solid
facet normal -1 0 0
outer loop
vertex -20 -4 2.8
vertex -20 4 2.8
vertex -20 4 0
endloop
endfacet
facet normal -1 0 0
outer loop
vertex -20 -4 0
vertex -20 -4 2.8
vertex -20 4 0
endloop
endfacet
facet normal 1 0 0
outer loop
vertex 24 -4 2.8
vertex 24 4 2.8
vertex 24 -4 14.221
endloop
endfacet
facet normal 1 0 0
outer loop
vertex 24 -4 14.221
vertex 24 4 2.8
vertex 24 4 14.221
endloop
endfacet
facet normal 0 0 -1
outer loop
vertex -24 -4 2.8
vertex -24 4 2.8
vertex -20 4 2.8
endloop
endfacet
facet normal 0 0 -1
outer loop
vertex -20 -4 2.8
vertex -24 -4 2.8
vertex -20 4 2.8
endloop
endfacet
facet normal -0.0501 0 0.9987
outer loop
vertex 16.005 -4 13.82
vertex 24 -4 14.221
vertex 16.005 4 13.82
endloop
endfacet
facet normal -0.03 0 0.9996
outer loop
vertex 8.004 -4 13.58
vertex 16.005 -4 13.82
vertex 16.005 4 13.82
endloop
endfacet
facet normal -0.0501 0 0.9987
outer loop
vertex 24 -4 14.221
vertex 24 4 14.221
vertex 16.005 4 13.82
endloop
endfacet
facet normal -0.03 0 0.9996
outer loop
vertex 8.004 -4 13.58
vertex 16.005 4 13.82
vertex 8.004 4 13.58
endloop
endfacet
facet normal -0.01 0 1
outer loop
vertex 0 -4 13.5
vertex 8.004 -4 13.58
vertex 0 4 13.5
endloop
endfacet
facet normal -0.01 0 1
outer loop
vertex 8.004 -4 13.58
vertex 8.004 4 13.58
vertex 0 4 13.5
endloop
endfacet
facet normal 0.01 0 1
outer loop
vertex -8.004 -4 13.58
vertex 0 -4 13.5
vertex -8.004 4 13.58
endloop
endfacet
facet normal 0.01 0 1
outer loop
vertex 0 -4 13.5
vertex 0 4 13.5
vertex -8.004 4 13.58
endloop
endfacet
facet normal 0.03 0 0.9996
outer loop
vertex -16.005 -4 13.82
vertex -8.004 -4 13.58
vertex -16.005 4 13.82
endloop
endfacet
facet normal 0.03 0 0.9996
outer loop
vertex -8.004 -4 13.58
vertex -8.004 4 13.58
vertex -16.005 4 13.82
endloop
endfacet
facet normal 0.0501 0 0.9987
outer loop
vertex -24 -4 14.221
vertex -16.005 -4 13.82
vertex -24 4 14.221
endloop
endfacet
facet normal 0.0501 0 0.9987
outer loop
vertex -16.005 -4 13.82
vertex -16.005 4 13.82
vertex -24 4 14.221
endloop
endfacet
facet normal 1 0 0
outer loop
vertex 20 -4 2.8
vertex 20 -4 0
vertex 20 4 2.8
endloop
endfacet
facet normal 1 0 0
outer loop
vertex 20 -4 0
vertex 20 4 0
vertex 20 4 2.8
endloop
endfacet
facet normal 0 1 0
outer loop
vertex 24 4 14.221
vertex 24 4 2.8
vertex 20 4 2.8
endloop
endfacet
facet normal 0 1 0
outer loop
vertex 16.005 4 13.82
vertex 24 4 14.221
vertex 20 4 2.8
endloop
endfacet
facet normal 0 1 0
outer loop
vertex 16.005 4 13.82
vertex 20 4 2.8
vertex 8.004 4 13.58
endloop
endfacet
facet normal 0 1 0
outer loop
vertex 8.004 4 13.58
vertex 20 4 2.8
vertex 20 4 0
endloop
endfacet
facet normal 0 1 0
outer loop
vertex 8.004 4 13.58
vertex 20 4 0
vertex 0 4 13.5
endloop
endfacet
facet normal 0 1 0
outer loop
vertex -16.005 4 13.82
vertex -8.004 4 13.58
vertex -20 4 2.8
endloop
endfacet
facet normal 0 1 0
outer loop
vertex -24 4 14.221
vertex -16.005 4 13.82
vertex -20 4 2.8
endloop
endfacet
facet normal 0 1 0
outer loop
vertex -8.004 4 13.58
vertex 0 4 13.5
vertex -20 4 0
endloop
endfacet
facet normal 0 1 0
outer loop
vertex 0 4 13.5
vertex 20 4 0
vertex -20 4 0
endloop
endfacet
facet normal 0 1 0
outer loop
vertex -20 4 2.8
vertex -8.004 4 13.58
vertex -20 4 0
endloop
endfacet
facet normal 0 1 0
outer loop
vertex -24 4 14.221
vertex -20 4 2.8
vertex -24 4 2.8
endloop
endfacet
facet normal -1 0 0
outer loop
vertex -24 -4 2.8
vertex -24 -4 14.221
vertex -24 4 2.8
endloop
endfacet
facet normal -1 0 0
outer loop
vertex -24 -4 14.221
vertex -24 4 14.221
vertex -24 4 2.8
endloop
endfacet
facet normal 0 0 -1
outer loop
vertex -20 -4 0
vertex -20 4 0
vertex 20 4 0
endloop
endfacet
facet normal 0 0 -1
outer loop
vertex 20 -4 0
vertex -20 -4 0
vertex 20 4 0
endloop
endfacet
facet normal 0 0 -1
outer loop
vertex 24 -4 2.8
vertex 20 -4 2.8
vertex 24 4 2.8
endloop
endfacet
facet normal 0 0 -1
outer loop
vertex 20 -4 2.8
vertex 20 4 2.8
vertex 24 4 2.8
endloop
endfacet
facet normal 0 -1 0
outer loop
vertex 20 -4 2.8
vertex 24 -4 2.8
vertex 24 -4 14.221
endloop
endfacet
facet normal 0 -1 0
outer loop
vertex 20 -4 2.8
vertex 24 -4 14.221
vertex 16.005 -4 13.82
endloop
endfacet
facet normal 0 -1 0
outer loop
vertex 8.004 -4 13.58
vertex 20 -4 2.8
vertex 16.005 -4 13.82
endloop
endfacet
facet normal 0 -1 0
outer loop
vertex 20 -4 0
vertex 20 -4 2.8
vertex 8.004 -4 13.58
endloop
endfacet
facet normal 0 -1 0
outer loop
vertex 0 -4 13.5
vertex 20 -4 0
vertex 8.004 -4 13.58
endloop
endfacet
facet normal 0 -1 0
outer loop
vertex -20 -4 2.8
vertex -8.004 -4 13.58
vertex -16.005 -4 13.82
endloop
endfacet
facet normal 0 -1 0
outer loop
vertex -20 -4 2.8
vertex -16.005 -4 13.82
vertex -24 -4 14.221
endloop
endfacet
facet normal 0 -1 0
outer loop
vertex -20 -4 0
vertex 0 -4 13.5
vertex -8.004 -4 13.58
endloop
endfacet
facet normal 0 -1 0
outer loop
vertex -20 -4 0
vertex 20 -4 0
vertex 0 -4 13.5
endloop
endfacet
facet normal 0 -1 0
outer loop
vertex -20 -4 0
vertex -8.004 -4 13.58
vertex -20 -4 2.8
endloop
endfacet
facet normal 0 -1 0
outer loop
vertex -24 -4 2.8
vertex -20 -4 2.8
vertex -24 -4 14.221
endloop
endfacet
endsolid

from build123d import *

# Parameters (mm, degrees)
BOSS_EXTRUDE1_DEPTH = 4


with BuildPart() as part:
    # Sketch1 → Boss-Extrude1 (new, symmetric)
    with BuildSketch(Plane(origin=(0, 0, 0), x_dir=(1, 0, 0), z_dir=(0, 1, 0))):
        with BuildLine():
            Line((-20, 0), (0, 0))
            Line((0, 0), (20, 0))
            Line((20, 0), (20, -2.8))
            Line((20, -2.8), (24, -2.8))
            Line((24, -2.8), (24, -14.220649169))
            ThreePointArc((24, -14.220649169), (0, -13.5), (-24, -14.220649169))
            Line((-24, -14.220649169), (-24, -2.8))
            Line((-24, -2.8), (-20, -2.8))
            Line((-20, -2.8), (-20, 0))
        make_face()
    extrude(amount=BOSS_EXTRUDE1_DEPTH, both=True)


solid = part.part
